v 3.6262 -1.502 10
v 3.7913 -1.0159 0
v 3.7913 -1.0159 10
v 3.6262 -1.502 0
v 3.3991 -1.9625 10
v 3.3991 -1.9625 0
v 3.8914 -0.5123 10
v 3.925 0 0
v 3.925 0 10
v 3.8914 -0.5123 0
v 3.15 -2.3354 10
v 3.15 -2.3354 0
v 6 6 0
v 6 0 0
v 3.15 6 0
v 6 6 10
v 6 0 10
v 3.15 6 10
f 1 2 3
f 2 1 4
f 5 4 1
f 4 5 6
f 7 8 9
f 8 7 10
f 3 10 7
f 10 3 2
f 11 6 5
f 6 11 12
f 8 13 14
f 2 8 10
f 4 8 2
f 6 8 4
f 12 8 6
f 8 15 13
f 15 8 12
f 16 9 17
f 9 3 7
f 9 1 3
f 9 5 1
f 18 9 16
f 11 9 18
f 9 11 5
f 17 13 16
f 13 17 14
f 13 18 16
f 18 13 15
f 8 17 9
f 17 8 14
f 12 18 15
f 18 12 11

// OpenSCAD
// Snap-on clip - a flat (10 mm tall) part that snaps onto a round stand rod and holds a piece
// of round tubing next to it, with a bridge joining the two rings. NOVEL general part.
//

rod_d  = 12.7;
tubing_d = 6;
bridge_w = 6;
height = 10;

$fn = 48;

ring_r = rod_d / 2 + 1.5;
open_x = -10;
open_w = 10;

difference() {
    union() {
        cylinder(h = height, d = ring_r);
        cylinder(h = height, d = tubing_d / 2 + 1);
        cube([bridge_w, 6, height]);
    }
    translate([-ring_r - 1, -open_w / 2 - 1, 0]) cube([open_w + 2, open_w + 2, height]);   // opening in the rod ring
    translate([15, -2.25 - 1, 0]) cube([4.5 + 2, 4.5 + 2, height]);                        // opening in the tubing ring
}
